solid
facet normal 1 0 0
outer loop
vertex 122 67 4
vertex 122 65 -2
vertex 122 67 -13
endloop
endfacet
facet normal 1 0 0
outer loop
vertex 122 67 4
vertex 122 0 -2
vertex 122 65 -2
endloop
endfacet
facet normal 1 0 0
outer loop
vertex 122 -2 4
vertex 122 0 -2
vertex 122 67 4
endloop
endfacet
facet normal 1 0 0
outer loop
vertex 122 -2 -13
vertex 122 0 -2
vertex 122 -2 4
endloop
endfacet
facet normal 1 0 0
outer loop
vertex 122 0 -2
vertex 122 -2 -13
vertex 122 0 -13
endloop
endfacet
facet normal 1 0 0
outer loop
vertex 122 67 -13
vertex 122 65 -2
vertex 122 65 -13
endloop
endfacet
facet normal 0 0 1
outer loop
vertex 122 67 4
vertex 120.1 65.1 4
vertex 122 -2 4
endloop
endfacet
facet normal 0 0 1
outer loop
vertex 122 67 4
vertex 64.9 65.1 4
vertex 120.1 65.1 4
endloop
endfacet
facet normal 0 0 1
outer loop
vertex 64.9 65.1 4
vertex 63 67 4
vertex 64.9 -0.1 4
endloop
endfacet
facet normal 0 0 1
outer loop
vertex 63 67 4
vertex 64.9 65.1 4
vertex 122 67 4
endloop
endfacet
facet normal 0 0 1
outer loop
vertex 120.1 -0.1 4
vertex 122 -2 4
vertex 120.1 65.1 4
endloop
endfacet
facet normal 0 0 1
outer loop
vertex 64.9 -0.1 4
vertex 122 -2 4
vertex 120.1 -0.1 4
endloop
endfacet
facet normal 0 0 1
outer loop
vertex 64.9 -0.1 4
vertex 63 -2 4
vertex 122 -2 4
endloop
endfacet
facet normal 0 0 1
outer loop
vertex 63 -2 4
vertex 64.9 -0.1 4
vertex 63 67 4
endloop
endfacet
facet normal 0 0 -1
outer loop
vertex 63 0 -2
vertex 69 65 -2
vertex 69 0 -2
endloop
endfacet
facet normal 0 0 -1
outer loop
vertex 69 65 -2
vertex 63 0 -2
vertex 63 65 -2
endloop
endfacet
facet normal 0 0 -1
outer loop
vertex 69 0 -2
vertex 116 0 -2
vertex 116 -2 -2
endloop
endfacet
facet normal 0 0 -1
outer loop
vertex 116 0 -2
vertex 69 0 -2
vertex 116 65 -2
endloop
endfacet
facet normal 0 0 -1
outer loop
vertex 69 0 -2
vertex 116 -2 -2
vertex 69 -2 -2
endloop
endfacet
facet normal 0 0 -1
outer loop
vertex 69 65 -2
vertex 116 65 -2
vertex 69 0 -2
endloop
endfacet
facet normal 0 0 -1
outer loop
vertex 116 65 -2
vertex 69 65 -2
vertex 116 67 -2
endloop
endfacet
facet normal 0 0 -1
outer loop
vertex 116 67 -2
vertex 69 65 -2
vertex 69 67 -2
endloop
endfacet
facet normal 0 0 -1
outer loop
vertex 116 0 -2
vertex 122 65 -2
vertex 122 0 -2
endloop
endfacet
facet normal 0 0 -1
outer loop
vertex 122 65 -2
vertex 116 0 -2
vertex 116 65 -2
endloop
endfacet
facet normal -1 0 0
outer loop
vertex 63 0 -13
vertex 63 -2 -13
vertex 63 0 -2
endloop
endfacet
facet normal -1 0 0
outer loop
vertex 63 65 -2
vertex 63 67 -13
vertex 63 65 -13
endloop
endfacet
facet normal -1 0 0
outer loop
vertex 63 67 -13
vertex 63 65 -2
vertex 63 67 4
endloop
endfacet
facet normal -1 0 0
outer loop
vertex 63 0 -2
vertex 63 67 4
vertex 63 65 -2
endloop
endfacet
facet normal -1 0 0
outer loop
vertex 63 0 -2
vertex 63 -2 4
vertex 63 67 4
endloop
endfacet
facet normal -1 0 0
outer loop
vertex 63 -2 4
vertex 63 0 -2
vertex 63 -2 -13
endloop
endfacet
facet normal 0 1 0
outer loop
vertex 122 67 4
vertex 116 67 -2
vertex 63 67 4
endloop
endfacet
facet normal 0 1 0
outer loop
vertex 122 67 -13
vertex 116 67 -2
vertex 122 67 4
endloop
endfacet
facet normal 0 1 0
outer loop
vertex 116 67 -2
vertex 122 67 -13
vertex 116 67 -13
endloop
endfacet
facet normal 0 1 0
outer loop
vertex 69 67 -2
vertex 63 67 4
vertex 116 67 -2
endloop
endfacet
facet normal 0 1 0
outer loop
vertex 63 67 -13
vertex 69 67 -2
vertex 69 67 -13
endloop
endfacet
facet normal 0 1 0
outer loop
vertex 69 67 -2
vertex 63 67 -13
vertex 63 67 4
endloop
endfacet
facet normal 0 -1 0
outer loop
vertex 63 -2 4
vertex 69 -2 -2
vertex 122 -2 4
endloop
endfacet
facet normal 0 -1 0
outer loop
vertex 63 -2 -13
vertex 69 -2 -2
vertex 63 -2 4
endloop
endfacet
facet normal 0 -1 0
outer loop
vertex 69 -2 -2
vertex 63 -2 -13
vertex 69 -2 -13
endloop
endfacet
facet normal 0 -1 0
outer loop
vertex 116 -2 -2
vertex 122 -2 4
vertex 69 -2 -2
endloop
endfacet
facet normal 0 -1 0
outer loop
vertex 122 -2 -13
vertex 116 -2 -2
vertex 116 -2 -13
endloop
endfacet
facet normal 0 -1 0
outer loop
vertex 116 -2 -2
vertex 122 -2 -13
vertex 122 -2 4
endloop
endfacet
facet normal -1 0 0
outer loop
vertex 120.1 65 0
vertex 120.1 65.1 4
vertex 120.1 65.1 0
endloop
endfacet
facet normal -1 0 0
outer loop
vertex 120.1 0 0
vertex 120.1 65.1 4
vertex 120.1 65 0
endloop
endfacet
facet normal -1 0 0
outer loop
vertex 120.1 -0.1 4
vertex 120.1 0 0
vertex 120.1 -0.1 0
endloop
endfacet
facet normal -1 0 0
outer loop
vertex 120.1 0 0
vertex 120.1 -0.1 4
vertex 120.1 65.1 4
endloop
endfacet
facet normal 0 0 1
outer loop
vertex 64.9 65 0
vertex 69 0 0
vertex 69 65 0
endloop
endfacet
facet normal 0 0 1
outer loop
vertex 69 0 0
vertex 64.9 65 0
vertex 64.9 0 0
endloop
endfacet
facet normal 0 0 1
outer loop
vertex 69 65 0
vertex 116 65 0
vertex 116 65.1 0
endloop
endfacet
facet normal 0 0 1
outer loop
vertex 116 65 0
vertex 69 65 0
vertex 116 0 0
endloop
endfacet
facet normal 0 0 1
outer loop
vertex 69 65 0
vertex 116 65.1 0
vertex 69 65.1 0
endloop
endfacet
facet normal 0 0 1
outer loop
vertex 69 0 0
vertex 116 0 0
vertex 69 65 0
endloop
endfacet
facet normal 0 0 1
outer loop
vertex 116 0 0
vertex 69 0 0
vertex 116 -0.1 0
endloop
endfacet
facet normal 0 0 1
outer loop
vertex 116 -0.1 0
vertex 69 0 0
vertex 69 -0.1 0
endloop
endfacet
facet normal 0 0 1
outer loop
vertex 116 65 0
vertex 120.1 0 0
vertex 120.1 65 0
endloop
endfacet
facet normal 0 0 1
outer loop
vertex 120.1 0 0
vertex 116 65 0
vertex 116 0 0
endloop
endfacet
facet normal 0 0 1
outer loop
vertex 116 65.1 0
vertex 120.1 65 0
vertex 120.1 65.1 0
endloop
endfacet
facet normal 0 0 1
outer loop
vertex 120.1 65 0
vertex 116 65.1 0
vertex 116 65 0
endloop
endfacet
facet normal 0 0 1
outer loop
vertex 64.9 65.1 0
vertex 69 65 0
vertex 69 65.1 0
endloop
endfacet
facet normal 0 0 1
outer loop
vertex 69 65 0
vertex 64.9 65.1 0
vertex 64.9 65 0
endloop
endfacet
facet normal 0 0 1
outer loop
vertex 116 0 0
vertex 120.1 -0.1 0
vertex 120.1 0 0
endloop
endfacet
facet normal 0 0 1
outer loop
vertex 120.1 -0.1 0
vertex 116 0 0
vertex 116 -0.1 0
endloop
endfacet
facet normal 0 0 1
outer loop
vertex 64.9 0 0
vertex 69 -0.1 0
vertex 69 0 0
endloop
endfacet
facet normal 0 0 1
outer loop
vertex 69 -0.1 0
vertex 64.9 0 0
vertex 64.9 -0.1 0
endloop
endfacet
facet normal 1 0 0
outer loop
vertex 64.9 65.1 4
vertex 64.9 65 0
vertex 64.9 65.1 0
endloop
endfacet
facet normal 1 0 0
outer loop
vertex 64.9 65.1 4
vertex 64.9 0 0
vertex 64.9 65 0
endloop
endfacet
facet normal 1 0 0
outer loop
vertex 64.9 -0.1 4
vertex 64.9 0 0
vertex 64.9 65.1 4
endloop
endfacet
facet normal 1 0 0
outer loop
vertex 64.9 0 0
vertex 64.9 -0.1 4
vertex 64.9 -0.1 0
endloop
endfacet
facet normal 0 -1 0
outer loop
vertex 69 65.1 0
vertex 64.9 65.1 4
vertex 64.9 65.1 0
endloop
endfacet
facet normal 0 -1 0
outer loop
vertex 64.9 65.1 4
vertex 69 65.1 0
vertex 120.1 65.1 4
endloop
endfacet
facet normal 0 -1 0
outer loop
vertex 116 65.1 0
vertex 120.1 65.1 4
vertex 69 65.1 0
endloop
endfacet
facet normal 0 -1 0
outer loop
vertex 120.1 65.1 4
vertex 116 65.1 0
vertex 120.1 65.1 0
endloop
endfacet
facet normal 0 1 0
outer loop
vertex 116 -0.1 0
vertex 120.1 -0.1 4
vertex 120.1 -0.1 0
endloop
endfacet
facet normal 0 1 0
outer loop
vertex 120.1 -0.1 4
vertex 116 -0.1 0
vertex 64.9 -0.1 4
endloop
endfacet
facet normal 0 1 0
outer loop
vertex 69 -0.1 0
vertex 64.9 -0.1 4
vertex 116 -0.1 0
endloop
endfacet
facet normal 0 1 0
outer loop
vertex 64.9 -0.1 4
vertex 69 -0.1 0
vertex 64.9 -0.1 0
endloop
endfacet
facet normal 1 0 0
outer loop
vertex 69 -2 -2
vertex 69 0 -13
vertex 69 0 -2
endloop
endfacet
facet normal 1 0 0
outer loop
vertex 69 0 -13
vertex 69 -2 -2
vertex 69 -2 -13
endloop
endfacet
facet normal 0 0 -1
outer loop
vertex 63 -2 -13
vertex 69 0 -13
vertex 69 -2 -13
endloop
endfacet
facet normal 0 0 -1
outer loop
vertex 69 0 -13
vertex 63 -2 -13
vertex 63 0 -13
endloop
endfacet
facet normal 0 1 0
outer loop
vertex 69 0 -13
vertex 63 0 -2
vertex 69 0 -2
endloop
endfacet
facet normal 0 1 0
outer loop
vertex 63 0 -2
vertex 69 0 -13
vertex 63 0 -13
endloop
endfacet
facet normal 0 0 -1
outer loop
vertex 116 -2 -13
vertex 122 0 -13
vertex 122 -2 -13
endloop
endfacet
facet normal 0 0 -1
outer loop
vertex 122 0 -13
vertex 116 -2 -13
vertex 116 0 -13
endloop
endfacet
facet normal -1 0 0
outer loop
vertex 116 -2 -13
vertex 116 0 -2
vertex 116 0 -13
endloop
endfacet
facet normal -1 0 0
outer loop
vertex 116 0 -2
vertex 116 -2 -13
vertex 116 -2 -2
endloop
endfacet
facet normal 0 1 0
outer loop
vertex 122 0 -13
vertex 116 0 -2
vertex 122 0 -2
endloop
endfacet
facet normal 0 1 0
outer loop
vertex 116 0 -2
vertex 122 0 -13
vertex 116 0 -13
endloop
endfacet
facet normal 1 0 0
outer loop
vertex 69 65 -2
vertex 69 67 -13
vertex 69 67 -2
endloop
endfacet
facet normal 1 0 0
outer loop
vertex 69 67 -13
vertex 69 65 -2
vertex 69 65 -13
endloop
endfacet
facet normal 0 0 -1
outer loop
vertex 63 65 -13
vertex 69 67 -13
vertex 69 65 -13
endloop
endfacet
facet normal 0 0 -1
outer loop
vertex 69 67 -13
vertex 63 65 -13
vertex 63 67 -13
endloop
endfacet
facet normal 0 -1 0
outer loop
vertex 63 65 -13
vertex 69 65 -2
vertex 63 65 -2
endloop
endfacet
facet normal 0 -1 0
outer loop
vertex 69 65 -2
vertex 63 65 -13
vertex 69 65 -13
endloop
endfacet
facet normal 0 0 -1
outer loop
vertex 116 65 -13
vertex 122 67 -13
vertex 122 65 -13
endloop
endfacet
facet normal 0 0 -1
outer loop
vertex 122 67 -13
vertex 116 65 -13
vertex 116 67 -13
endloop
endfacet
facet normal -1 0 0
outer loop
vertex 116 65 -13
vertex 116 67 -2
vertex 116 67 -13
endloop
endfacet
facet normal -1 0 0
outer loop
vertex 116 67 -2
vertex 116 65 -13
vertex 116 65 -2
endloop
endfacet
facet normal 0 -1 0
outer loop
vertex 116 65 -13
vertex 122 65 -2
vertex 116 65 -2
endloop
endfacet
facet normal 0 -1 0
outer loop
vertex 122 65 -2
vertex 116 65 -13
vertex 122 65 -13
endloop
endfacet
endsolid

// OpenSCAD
psuBoardWidth=55;
psuBoardHeight=65;
wallThickness=2;

portSize=6;
cableM = 3;

function pcbToCaseX(pcb) = pcb;
function pcbToCaseY(pcb) = psuBoardHeight - pcb;

containerHeight=22;

legHeight = 13;

translate([psuBoardWidth + 10, 0, 0]) {
    difference() {
        translate([-1 * wallThickness, -1 * wallThickness, -wallThickness]) {
            cube([2 * wallThickness + psuBoardWidth, 2 * wallThickness + psuBoardHeight, 3 * wallThickness]);
        }
        translate([-0.1, -0.1,0]) {
            cube([psuBoardWidth + 0.2, psuBoardHeight + 0.2,2 * wallThickness + 0.01]);
        }
    }
    translate([-wallThickness, -1 * wallThickness, -legHeight]) {
        cube([wallThickness * 3, wallThickness, legHeight]);
    }
    translate([psuBoardWidth - 2 * wallThickness, -1 * wallThickness, -legHeight]) {
        cube([wallThickness * 3, wallThickness, legHeight]);
    }

    translate([-wallThickness, psuBoardHeight + 0 * wallThickness, -legHeight]) {
        cube([wallThickness * 3, wallThickness, legHeight]);
    }
    translate([psuBoardWidth - 2 * wallThickness, psuBoardHeight + 0 * wallThickness, -legHeight]) {
        cube([wallThickness * 3, wallThickness, legHeight]);
    }
}
